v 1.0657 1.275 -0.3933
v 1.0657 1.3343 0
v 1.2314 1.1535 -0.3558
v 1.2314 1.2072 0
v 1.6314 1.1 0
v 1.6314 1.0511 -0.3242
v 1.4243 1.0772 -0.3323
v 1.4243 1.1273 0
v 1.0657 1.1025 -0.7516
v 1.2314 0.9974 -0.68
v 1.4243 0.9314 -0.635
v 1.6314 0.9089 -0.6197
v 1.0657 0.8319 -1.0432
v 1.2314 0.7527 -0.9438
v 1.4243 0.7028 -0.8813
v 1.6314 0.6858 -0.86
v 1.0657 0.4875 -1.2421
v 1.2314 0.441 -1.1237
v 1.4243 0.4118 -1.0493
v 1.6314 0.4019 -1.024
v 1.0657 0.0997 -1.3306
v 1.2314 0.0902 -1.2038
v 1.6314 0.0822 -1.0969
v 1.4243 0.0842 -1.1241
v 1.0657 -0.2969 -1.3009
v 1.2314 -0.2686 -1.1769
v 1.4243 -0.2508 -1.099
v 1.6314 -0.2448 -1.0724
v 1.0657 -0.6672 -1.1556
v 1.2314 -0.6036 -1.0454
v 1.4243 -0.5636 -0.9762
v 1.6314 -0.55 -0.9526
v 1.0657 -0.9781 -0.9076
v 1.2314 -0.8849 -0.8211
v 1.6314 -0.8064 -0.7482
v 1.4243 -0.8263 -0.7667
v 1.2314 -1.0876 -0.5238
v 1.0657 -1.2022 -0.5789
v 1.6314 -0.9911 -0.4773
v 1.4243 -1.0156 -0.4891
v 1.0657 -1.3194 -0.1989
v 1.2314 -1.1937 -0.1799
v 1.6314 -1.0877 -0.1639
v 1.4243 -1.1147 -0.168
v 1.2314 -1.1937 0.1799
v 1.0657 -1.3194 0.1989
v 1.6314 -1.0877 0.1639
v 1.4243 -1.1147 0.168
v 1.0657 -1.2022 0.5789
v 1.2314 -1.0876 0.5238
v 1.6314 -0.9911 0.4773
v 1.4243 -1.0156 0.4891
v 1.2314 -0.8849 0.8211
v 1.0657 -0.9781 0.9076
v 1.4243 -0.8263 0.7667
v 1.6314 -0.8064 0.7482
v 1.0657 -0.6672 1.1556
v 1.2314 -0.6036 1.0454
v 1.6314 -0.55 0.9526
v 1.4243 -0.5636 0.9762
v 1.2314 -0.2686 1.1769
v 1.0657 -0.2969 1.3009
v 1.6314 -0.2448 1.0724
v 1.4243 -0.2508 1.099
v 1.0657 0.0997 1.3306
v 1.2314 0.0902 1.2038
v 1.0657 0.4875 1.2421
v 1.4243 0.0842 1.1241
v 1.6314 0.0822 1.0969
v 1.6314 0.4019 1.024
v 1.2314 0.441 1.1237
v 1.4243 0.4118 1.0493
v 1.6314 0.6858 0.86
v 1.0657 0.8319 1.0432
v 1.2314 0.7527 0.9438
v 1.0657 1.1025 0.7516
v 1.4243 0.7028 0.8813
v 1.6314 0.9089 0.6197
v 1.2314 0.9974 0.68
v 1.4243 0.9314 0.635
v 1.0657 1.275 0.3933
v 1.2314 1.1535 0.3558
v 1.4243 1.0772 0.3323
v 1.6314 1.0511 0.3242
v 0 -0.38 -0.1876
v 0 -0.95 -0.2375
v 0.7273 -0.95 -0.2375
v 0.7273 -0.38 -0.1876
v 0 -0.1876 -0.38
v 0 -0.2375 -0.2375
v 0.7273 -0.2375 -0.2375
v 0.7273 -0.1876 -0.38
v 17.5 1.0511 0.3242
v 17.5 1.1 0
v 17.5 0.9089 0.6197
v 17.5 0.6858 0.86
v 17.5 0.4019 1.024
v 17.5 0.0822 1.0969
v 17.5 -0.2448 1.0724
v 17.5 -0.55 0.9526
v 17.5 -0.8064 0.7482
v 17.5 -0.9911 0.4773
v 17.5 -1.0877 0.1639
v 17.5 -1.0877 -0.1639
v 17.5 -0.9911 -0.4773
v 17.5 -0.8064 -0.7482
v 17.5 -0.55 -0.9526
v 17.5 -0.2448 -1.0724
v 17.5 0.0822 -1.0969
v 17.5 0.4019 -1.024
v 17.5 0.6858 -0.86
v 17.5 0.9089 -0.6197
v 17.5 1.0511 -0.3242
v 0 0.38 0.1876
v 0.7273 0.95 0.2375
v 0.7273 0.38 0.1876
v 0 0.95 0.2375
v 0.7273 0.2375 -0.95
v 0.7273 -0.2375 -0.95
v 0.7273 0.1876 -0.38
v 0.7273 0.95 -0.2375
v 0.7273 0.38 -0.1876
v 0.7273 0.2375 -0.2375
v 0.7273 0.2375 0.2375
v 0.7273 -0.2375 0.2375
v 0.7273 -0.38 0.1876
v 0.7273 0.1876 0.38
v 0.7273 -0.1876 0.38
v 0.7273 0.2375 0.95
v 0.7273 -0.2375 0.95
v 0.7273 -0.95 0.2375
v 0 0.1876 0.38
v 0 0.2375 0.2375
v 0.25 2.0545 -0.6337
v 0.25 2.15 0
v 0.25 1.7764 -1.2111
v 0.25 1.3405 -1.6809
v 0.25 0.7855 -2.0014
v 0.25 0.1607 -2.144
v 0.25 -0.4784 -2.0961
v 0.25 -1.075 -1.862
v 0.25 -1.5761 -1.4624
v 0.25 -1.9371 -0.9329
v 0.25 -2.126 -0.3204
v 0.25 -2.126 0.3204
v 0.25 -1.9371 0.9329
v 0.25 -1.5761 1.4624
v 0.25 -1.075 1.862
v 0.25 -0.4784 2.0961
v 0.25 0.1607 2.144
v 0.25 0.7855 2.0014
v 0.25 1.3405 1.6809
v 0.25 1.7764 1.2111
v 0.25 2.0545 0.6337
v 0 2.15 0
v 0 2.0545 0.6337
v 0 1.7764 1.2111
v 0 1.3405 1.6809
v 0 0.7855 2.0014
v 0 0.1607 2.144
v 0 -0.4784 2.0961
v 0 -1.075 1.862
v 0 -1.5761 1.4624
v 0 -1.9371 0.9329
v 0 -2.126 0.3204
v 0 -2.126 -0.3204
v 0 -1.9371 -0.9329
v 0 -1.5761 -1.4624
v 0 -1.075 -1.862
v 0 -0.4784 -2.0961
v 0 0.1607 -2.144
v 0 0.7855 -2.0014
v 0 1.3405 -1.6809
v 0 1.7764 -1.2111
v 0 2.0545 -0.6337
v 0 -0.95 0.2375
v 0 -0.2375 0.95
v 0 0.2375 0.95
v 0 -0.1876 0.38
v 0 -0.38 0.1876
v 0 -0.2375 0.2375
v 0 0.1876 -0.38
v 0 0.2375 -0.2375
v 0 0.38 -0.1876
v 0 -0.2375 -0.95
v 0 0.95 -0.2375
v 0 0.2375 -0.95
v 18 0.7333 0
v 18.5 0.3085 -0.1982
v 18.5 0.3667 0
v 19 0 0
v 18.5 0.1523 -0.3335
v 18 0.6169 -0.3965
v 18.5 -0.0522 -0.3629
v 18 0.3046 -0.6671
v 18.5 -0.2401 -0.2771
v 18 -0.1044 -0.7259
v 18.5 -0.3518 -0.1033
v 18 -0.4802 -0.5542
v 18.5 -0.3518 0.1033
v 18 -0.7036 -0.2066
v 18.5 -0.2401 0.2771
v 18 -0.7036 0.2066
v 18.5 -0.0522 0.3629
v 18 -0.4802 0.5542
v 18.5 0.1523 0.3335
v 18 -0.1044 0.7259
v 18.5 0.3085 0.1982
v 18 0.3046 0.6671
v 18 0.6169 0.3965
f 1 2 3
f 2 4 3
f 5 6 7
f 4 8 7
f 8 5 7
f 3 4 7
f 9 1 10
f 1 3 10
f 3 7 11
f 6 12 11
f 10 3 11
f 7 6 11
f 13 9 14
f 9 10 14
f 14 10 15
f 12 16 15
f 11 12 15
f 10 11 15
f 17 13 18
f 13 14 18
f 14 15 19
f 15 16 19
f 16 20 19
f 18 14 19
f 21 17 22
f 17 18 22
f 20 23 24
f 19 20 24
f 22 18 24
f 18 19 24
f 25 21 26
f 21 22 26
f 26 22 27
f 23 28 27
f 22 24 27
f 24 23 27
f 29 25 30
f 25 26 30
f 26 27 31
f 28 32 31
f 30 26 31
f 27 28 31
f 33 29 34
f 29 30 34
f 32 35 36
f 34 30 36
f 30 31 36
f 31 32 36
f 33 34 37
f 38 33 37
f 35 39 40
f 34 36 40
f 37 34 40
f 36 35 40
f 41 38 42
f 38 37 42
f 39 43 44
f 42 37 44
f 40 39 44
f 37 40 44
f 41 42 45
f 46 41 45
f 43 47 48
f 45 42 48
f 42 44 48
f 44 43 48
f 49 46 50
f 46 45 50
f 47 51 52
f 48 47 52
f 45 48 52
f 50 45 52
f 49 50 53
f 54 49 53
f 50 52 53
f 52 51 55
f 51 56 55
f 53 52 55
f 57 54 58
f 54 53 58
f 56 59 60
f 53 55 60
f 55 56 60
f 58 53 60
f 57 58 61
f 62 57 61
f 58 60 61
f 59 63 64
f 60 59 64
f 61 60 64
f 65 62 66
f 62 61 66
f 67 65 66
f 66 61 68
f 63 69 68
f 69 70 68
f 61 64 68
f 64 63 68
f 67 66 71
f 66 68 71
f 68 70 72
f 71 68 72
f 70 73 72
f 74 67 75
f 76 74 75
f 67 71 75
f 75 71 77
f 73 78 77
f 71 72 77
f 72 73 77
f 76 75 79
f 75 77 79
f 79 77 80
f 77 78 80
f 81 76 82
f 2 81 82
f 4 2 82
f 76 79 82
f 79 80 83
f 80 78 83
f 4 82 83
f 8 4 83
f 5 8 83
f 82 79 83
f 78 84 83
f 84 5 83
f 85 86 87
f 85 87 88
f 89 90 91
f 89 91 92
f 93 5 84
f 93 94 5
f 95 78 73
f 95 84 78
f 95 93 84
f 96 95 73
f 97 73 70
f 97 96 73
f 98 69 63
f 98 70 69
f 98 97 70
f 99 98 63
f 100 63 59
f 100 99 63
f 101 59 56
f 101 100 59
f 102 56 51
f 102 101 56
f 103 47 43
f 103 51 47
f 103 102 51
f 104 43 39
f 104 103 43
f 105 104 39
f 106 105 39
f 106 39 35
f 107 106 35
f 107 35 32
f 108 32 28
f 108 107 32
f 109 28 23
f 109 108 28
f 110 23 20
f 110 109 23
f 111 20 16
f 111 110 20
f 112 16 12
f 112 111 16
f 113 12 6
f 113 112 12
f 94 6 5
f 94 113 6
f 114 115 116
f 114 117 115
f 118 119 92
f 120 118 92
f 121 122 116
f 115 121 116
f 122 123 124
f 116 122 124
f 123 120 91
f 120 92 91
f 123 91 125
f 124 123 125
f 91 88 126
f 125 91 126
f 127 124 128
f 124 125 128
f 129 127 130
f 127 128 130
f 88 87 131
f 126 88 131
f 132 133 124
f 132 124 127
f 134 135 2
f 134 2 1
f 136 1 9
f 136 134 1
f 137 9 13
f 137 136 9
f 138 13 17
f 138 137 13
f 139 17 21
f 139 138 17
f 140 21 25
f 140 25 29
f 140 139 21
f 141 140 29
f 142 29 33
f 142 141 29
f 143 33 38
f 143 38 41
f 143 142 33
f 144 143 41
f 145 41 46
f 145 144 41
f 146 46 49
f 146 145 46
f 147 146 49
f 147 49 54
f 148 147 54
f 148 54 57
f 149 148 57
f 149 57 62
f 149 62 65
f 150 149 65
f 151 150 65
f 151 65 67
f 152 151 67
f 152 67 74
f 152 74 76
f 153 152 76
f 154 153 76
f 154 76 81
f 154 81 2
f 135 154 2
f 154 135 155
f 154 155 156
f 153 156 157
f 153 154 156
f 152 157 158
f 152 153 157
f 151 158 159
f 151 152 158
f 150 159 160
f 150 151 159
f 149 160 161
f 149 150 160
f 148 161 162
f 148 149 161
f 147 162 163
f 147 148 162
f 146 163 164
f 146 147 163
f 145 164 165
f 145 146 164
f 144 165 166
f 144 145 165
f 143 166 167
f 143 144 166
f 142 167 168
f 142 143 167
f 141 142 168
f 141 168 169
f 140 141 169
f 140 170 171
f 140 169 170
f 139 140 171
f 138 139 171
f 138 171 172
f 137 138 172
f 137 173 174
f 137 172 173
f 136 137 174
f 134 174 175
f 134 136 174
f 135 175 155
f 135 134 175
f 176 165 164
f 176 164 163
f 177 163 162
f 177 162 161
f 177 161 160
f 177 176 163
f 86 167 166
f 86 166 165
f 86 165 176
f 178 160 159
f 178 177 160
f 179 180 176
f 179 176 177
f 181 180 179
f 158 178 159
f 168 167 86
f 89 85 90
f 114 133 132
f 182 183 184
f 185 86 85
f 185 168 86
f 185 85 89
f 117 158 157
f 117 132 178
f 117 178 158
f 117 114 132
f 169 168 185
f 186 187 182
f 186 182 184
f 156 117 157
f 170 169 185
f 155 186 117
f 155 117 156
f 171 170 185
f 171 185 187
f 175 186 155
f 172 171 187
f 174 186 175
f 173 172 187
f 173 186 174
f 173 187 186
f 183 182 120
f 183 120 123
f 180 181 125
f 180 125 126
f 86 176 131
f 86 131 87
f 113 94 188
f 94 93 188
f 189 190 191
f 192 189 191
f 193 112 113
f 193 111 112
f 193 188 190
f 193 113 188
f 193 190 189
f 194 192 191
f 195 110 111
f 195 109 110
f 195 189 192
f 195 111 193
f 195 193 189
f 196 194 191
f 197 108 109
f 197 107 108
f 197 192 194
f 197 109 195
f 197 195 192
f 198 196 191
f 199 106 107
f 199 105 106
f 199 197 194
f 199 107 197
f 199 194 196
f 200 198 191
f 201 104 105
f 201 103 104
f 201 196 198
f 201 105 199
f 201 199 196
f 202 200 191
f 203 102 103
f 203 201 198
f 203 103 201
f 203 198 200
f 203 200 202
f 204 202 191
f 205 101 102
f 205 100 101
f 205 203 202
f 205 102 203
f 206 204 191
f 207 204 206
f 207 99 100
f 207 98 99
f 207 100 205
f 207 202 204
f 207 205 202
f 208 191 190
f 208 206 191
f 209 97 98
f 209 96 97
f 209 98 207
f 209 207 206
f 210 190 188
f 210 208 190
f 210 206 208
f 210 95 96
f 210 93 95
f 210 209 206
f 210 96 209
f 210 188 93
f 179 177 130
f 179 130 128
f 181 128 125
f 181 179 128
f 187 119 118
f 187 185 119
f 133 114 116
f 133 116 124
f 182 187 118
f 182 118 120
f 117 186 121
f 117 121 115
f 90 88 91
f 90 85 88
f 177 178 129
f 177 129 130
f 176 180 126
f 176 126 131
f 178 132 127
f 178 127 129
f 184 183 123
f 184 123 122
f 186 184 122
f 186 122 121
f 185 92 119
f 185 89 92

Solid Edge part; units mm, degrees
sketch "Sketch1" plane through (0, 0, 0) normal (0, 0, 1) x (1, 0, 0)
  line L0 (0, 0) -> (0, 2.15)
  line L1 (0, 2.15) -> (0.25, 2.15)
  line L2 (0.25, 2.15) -> (1.0657, 1.3343)
  arc A0 (1.0657, 1.3343) -> (1.6314, 1.1) centre (1.6314, 1.9) ccw
  line L3 (1.6314, 1.1) -> (17.5, 1.1)
  line L4 (17.5, 1.1) -> (19, 0)
  line L5 (19, 0) -> (0, 0)
revolve "RevolvedProtrusion1" add sketch "Sketch1" angle 360 about axis through (23.3, 0, 0) along (-1, 0, 0)
cosmetic_thread "Thread_1" size "M2.2" thread depth 15.4
sketch "Sketch2" plane through (0, 0, 0) normal (1, 0, 0) x (0, 1, 0)
  line L0 (0.2375, 0.95) -> (-0.2375, 0.95)
  line L1 (-0.2375, 0.95) -> (-0.1876, 0.38)
  line L2 (-0.1876, 0.38) -> (-0.2375, 0.2375)
  line L3 (-0.2375, 0.2375) -> (-0.38, 0.1876)
  line L4 (-0.38, 0.1876) -> (-0.95, 0.2375)
  line L5 (-0.95, 0.2375) -> (-0.95, -0.2375)
  line L6 (-0.95, -0.2375) -> (-0.38, -0.1876)
  line L7 (-0.38, -0.1876) -> (-0.2375, -0.2375)
  line L8 (-0.2375, -0.2375) -> (-0.1876, -0.38)
  line L9 (-0.1876, -0.38) -> (-0.2375, -0.95)
  line L10 (-0.2375, -0.95) -> (0.2375, -0.95)
  line L11 (0.2375, -0.95) -> (0.1876, -0.38)
  line L12 (0.1876, -0.38) -> (0.2375, -0.2375)
  line L13 (0.2375, -0.2375) -> (0.38, -0.1876)
  line L14 (0.38, -0.1876) -> (0.95, -0.2375)
  line L15 (0.95, -0.2375) -> (0.95, 0.2375)
  line L16 (0.95, 0.2375) -> (0.38, 0.1876)
  line L17 (0.38, 0.1876) -> (0.2375, 0.2375)
  line L18 (0.2375, 0.2375) -> (0.1876, 0.38)
  line L19 (0.1876, 0.38) -> (0.2375, 0.95)
extrude "ExtrudedCutout_1" cut sketch "Sketch2" along normal blind 0.7273
properties part number "bene_inox_212409-2,2X19"
